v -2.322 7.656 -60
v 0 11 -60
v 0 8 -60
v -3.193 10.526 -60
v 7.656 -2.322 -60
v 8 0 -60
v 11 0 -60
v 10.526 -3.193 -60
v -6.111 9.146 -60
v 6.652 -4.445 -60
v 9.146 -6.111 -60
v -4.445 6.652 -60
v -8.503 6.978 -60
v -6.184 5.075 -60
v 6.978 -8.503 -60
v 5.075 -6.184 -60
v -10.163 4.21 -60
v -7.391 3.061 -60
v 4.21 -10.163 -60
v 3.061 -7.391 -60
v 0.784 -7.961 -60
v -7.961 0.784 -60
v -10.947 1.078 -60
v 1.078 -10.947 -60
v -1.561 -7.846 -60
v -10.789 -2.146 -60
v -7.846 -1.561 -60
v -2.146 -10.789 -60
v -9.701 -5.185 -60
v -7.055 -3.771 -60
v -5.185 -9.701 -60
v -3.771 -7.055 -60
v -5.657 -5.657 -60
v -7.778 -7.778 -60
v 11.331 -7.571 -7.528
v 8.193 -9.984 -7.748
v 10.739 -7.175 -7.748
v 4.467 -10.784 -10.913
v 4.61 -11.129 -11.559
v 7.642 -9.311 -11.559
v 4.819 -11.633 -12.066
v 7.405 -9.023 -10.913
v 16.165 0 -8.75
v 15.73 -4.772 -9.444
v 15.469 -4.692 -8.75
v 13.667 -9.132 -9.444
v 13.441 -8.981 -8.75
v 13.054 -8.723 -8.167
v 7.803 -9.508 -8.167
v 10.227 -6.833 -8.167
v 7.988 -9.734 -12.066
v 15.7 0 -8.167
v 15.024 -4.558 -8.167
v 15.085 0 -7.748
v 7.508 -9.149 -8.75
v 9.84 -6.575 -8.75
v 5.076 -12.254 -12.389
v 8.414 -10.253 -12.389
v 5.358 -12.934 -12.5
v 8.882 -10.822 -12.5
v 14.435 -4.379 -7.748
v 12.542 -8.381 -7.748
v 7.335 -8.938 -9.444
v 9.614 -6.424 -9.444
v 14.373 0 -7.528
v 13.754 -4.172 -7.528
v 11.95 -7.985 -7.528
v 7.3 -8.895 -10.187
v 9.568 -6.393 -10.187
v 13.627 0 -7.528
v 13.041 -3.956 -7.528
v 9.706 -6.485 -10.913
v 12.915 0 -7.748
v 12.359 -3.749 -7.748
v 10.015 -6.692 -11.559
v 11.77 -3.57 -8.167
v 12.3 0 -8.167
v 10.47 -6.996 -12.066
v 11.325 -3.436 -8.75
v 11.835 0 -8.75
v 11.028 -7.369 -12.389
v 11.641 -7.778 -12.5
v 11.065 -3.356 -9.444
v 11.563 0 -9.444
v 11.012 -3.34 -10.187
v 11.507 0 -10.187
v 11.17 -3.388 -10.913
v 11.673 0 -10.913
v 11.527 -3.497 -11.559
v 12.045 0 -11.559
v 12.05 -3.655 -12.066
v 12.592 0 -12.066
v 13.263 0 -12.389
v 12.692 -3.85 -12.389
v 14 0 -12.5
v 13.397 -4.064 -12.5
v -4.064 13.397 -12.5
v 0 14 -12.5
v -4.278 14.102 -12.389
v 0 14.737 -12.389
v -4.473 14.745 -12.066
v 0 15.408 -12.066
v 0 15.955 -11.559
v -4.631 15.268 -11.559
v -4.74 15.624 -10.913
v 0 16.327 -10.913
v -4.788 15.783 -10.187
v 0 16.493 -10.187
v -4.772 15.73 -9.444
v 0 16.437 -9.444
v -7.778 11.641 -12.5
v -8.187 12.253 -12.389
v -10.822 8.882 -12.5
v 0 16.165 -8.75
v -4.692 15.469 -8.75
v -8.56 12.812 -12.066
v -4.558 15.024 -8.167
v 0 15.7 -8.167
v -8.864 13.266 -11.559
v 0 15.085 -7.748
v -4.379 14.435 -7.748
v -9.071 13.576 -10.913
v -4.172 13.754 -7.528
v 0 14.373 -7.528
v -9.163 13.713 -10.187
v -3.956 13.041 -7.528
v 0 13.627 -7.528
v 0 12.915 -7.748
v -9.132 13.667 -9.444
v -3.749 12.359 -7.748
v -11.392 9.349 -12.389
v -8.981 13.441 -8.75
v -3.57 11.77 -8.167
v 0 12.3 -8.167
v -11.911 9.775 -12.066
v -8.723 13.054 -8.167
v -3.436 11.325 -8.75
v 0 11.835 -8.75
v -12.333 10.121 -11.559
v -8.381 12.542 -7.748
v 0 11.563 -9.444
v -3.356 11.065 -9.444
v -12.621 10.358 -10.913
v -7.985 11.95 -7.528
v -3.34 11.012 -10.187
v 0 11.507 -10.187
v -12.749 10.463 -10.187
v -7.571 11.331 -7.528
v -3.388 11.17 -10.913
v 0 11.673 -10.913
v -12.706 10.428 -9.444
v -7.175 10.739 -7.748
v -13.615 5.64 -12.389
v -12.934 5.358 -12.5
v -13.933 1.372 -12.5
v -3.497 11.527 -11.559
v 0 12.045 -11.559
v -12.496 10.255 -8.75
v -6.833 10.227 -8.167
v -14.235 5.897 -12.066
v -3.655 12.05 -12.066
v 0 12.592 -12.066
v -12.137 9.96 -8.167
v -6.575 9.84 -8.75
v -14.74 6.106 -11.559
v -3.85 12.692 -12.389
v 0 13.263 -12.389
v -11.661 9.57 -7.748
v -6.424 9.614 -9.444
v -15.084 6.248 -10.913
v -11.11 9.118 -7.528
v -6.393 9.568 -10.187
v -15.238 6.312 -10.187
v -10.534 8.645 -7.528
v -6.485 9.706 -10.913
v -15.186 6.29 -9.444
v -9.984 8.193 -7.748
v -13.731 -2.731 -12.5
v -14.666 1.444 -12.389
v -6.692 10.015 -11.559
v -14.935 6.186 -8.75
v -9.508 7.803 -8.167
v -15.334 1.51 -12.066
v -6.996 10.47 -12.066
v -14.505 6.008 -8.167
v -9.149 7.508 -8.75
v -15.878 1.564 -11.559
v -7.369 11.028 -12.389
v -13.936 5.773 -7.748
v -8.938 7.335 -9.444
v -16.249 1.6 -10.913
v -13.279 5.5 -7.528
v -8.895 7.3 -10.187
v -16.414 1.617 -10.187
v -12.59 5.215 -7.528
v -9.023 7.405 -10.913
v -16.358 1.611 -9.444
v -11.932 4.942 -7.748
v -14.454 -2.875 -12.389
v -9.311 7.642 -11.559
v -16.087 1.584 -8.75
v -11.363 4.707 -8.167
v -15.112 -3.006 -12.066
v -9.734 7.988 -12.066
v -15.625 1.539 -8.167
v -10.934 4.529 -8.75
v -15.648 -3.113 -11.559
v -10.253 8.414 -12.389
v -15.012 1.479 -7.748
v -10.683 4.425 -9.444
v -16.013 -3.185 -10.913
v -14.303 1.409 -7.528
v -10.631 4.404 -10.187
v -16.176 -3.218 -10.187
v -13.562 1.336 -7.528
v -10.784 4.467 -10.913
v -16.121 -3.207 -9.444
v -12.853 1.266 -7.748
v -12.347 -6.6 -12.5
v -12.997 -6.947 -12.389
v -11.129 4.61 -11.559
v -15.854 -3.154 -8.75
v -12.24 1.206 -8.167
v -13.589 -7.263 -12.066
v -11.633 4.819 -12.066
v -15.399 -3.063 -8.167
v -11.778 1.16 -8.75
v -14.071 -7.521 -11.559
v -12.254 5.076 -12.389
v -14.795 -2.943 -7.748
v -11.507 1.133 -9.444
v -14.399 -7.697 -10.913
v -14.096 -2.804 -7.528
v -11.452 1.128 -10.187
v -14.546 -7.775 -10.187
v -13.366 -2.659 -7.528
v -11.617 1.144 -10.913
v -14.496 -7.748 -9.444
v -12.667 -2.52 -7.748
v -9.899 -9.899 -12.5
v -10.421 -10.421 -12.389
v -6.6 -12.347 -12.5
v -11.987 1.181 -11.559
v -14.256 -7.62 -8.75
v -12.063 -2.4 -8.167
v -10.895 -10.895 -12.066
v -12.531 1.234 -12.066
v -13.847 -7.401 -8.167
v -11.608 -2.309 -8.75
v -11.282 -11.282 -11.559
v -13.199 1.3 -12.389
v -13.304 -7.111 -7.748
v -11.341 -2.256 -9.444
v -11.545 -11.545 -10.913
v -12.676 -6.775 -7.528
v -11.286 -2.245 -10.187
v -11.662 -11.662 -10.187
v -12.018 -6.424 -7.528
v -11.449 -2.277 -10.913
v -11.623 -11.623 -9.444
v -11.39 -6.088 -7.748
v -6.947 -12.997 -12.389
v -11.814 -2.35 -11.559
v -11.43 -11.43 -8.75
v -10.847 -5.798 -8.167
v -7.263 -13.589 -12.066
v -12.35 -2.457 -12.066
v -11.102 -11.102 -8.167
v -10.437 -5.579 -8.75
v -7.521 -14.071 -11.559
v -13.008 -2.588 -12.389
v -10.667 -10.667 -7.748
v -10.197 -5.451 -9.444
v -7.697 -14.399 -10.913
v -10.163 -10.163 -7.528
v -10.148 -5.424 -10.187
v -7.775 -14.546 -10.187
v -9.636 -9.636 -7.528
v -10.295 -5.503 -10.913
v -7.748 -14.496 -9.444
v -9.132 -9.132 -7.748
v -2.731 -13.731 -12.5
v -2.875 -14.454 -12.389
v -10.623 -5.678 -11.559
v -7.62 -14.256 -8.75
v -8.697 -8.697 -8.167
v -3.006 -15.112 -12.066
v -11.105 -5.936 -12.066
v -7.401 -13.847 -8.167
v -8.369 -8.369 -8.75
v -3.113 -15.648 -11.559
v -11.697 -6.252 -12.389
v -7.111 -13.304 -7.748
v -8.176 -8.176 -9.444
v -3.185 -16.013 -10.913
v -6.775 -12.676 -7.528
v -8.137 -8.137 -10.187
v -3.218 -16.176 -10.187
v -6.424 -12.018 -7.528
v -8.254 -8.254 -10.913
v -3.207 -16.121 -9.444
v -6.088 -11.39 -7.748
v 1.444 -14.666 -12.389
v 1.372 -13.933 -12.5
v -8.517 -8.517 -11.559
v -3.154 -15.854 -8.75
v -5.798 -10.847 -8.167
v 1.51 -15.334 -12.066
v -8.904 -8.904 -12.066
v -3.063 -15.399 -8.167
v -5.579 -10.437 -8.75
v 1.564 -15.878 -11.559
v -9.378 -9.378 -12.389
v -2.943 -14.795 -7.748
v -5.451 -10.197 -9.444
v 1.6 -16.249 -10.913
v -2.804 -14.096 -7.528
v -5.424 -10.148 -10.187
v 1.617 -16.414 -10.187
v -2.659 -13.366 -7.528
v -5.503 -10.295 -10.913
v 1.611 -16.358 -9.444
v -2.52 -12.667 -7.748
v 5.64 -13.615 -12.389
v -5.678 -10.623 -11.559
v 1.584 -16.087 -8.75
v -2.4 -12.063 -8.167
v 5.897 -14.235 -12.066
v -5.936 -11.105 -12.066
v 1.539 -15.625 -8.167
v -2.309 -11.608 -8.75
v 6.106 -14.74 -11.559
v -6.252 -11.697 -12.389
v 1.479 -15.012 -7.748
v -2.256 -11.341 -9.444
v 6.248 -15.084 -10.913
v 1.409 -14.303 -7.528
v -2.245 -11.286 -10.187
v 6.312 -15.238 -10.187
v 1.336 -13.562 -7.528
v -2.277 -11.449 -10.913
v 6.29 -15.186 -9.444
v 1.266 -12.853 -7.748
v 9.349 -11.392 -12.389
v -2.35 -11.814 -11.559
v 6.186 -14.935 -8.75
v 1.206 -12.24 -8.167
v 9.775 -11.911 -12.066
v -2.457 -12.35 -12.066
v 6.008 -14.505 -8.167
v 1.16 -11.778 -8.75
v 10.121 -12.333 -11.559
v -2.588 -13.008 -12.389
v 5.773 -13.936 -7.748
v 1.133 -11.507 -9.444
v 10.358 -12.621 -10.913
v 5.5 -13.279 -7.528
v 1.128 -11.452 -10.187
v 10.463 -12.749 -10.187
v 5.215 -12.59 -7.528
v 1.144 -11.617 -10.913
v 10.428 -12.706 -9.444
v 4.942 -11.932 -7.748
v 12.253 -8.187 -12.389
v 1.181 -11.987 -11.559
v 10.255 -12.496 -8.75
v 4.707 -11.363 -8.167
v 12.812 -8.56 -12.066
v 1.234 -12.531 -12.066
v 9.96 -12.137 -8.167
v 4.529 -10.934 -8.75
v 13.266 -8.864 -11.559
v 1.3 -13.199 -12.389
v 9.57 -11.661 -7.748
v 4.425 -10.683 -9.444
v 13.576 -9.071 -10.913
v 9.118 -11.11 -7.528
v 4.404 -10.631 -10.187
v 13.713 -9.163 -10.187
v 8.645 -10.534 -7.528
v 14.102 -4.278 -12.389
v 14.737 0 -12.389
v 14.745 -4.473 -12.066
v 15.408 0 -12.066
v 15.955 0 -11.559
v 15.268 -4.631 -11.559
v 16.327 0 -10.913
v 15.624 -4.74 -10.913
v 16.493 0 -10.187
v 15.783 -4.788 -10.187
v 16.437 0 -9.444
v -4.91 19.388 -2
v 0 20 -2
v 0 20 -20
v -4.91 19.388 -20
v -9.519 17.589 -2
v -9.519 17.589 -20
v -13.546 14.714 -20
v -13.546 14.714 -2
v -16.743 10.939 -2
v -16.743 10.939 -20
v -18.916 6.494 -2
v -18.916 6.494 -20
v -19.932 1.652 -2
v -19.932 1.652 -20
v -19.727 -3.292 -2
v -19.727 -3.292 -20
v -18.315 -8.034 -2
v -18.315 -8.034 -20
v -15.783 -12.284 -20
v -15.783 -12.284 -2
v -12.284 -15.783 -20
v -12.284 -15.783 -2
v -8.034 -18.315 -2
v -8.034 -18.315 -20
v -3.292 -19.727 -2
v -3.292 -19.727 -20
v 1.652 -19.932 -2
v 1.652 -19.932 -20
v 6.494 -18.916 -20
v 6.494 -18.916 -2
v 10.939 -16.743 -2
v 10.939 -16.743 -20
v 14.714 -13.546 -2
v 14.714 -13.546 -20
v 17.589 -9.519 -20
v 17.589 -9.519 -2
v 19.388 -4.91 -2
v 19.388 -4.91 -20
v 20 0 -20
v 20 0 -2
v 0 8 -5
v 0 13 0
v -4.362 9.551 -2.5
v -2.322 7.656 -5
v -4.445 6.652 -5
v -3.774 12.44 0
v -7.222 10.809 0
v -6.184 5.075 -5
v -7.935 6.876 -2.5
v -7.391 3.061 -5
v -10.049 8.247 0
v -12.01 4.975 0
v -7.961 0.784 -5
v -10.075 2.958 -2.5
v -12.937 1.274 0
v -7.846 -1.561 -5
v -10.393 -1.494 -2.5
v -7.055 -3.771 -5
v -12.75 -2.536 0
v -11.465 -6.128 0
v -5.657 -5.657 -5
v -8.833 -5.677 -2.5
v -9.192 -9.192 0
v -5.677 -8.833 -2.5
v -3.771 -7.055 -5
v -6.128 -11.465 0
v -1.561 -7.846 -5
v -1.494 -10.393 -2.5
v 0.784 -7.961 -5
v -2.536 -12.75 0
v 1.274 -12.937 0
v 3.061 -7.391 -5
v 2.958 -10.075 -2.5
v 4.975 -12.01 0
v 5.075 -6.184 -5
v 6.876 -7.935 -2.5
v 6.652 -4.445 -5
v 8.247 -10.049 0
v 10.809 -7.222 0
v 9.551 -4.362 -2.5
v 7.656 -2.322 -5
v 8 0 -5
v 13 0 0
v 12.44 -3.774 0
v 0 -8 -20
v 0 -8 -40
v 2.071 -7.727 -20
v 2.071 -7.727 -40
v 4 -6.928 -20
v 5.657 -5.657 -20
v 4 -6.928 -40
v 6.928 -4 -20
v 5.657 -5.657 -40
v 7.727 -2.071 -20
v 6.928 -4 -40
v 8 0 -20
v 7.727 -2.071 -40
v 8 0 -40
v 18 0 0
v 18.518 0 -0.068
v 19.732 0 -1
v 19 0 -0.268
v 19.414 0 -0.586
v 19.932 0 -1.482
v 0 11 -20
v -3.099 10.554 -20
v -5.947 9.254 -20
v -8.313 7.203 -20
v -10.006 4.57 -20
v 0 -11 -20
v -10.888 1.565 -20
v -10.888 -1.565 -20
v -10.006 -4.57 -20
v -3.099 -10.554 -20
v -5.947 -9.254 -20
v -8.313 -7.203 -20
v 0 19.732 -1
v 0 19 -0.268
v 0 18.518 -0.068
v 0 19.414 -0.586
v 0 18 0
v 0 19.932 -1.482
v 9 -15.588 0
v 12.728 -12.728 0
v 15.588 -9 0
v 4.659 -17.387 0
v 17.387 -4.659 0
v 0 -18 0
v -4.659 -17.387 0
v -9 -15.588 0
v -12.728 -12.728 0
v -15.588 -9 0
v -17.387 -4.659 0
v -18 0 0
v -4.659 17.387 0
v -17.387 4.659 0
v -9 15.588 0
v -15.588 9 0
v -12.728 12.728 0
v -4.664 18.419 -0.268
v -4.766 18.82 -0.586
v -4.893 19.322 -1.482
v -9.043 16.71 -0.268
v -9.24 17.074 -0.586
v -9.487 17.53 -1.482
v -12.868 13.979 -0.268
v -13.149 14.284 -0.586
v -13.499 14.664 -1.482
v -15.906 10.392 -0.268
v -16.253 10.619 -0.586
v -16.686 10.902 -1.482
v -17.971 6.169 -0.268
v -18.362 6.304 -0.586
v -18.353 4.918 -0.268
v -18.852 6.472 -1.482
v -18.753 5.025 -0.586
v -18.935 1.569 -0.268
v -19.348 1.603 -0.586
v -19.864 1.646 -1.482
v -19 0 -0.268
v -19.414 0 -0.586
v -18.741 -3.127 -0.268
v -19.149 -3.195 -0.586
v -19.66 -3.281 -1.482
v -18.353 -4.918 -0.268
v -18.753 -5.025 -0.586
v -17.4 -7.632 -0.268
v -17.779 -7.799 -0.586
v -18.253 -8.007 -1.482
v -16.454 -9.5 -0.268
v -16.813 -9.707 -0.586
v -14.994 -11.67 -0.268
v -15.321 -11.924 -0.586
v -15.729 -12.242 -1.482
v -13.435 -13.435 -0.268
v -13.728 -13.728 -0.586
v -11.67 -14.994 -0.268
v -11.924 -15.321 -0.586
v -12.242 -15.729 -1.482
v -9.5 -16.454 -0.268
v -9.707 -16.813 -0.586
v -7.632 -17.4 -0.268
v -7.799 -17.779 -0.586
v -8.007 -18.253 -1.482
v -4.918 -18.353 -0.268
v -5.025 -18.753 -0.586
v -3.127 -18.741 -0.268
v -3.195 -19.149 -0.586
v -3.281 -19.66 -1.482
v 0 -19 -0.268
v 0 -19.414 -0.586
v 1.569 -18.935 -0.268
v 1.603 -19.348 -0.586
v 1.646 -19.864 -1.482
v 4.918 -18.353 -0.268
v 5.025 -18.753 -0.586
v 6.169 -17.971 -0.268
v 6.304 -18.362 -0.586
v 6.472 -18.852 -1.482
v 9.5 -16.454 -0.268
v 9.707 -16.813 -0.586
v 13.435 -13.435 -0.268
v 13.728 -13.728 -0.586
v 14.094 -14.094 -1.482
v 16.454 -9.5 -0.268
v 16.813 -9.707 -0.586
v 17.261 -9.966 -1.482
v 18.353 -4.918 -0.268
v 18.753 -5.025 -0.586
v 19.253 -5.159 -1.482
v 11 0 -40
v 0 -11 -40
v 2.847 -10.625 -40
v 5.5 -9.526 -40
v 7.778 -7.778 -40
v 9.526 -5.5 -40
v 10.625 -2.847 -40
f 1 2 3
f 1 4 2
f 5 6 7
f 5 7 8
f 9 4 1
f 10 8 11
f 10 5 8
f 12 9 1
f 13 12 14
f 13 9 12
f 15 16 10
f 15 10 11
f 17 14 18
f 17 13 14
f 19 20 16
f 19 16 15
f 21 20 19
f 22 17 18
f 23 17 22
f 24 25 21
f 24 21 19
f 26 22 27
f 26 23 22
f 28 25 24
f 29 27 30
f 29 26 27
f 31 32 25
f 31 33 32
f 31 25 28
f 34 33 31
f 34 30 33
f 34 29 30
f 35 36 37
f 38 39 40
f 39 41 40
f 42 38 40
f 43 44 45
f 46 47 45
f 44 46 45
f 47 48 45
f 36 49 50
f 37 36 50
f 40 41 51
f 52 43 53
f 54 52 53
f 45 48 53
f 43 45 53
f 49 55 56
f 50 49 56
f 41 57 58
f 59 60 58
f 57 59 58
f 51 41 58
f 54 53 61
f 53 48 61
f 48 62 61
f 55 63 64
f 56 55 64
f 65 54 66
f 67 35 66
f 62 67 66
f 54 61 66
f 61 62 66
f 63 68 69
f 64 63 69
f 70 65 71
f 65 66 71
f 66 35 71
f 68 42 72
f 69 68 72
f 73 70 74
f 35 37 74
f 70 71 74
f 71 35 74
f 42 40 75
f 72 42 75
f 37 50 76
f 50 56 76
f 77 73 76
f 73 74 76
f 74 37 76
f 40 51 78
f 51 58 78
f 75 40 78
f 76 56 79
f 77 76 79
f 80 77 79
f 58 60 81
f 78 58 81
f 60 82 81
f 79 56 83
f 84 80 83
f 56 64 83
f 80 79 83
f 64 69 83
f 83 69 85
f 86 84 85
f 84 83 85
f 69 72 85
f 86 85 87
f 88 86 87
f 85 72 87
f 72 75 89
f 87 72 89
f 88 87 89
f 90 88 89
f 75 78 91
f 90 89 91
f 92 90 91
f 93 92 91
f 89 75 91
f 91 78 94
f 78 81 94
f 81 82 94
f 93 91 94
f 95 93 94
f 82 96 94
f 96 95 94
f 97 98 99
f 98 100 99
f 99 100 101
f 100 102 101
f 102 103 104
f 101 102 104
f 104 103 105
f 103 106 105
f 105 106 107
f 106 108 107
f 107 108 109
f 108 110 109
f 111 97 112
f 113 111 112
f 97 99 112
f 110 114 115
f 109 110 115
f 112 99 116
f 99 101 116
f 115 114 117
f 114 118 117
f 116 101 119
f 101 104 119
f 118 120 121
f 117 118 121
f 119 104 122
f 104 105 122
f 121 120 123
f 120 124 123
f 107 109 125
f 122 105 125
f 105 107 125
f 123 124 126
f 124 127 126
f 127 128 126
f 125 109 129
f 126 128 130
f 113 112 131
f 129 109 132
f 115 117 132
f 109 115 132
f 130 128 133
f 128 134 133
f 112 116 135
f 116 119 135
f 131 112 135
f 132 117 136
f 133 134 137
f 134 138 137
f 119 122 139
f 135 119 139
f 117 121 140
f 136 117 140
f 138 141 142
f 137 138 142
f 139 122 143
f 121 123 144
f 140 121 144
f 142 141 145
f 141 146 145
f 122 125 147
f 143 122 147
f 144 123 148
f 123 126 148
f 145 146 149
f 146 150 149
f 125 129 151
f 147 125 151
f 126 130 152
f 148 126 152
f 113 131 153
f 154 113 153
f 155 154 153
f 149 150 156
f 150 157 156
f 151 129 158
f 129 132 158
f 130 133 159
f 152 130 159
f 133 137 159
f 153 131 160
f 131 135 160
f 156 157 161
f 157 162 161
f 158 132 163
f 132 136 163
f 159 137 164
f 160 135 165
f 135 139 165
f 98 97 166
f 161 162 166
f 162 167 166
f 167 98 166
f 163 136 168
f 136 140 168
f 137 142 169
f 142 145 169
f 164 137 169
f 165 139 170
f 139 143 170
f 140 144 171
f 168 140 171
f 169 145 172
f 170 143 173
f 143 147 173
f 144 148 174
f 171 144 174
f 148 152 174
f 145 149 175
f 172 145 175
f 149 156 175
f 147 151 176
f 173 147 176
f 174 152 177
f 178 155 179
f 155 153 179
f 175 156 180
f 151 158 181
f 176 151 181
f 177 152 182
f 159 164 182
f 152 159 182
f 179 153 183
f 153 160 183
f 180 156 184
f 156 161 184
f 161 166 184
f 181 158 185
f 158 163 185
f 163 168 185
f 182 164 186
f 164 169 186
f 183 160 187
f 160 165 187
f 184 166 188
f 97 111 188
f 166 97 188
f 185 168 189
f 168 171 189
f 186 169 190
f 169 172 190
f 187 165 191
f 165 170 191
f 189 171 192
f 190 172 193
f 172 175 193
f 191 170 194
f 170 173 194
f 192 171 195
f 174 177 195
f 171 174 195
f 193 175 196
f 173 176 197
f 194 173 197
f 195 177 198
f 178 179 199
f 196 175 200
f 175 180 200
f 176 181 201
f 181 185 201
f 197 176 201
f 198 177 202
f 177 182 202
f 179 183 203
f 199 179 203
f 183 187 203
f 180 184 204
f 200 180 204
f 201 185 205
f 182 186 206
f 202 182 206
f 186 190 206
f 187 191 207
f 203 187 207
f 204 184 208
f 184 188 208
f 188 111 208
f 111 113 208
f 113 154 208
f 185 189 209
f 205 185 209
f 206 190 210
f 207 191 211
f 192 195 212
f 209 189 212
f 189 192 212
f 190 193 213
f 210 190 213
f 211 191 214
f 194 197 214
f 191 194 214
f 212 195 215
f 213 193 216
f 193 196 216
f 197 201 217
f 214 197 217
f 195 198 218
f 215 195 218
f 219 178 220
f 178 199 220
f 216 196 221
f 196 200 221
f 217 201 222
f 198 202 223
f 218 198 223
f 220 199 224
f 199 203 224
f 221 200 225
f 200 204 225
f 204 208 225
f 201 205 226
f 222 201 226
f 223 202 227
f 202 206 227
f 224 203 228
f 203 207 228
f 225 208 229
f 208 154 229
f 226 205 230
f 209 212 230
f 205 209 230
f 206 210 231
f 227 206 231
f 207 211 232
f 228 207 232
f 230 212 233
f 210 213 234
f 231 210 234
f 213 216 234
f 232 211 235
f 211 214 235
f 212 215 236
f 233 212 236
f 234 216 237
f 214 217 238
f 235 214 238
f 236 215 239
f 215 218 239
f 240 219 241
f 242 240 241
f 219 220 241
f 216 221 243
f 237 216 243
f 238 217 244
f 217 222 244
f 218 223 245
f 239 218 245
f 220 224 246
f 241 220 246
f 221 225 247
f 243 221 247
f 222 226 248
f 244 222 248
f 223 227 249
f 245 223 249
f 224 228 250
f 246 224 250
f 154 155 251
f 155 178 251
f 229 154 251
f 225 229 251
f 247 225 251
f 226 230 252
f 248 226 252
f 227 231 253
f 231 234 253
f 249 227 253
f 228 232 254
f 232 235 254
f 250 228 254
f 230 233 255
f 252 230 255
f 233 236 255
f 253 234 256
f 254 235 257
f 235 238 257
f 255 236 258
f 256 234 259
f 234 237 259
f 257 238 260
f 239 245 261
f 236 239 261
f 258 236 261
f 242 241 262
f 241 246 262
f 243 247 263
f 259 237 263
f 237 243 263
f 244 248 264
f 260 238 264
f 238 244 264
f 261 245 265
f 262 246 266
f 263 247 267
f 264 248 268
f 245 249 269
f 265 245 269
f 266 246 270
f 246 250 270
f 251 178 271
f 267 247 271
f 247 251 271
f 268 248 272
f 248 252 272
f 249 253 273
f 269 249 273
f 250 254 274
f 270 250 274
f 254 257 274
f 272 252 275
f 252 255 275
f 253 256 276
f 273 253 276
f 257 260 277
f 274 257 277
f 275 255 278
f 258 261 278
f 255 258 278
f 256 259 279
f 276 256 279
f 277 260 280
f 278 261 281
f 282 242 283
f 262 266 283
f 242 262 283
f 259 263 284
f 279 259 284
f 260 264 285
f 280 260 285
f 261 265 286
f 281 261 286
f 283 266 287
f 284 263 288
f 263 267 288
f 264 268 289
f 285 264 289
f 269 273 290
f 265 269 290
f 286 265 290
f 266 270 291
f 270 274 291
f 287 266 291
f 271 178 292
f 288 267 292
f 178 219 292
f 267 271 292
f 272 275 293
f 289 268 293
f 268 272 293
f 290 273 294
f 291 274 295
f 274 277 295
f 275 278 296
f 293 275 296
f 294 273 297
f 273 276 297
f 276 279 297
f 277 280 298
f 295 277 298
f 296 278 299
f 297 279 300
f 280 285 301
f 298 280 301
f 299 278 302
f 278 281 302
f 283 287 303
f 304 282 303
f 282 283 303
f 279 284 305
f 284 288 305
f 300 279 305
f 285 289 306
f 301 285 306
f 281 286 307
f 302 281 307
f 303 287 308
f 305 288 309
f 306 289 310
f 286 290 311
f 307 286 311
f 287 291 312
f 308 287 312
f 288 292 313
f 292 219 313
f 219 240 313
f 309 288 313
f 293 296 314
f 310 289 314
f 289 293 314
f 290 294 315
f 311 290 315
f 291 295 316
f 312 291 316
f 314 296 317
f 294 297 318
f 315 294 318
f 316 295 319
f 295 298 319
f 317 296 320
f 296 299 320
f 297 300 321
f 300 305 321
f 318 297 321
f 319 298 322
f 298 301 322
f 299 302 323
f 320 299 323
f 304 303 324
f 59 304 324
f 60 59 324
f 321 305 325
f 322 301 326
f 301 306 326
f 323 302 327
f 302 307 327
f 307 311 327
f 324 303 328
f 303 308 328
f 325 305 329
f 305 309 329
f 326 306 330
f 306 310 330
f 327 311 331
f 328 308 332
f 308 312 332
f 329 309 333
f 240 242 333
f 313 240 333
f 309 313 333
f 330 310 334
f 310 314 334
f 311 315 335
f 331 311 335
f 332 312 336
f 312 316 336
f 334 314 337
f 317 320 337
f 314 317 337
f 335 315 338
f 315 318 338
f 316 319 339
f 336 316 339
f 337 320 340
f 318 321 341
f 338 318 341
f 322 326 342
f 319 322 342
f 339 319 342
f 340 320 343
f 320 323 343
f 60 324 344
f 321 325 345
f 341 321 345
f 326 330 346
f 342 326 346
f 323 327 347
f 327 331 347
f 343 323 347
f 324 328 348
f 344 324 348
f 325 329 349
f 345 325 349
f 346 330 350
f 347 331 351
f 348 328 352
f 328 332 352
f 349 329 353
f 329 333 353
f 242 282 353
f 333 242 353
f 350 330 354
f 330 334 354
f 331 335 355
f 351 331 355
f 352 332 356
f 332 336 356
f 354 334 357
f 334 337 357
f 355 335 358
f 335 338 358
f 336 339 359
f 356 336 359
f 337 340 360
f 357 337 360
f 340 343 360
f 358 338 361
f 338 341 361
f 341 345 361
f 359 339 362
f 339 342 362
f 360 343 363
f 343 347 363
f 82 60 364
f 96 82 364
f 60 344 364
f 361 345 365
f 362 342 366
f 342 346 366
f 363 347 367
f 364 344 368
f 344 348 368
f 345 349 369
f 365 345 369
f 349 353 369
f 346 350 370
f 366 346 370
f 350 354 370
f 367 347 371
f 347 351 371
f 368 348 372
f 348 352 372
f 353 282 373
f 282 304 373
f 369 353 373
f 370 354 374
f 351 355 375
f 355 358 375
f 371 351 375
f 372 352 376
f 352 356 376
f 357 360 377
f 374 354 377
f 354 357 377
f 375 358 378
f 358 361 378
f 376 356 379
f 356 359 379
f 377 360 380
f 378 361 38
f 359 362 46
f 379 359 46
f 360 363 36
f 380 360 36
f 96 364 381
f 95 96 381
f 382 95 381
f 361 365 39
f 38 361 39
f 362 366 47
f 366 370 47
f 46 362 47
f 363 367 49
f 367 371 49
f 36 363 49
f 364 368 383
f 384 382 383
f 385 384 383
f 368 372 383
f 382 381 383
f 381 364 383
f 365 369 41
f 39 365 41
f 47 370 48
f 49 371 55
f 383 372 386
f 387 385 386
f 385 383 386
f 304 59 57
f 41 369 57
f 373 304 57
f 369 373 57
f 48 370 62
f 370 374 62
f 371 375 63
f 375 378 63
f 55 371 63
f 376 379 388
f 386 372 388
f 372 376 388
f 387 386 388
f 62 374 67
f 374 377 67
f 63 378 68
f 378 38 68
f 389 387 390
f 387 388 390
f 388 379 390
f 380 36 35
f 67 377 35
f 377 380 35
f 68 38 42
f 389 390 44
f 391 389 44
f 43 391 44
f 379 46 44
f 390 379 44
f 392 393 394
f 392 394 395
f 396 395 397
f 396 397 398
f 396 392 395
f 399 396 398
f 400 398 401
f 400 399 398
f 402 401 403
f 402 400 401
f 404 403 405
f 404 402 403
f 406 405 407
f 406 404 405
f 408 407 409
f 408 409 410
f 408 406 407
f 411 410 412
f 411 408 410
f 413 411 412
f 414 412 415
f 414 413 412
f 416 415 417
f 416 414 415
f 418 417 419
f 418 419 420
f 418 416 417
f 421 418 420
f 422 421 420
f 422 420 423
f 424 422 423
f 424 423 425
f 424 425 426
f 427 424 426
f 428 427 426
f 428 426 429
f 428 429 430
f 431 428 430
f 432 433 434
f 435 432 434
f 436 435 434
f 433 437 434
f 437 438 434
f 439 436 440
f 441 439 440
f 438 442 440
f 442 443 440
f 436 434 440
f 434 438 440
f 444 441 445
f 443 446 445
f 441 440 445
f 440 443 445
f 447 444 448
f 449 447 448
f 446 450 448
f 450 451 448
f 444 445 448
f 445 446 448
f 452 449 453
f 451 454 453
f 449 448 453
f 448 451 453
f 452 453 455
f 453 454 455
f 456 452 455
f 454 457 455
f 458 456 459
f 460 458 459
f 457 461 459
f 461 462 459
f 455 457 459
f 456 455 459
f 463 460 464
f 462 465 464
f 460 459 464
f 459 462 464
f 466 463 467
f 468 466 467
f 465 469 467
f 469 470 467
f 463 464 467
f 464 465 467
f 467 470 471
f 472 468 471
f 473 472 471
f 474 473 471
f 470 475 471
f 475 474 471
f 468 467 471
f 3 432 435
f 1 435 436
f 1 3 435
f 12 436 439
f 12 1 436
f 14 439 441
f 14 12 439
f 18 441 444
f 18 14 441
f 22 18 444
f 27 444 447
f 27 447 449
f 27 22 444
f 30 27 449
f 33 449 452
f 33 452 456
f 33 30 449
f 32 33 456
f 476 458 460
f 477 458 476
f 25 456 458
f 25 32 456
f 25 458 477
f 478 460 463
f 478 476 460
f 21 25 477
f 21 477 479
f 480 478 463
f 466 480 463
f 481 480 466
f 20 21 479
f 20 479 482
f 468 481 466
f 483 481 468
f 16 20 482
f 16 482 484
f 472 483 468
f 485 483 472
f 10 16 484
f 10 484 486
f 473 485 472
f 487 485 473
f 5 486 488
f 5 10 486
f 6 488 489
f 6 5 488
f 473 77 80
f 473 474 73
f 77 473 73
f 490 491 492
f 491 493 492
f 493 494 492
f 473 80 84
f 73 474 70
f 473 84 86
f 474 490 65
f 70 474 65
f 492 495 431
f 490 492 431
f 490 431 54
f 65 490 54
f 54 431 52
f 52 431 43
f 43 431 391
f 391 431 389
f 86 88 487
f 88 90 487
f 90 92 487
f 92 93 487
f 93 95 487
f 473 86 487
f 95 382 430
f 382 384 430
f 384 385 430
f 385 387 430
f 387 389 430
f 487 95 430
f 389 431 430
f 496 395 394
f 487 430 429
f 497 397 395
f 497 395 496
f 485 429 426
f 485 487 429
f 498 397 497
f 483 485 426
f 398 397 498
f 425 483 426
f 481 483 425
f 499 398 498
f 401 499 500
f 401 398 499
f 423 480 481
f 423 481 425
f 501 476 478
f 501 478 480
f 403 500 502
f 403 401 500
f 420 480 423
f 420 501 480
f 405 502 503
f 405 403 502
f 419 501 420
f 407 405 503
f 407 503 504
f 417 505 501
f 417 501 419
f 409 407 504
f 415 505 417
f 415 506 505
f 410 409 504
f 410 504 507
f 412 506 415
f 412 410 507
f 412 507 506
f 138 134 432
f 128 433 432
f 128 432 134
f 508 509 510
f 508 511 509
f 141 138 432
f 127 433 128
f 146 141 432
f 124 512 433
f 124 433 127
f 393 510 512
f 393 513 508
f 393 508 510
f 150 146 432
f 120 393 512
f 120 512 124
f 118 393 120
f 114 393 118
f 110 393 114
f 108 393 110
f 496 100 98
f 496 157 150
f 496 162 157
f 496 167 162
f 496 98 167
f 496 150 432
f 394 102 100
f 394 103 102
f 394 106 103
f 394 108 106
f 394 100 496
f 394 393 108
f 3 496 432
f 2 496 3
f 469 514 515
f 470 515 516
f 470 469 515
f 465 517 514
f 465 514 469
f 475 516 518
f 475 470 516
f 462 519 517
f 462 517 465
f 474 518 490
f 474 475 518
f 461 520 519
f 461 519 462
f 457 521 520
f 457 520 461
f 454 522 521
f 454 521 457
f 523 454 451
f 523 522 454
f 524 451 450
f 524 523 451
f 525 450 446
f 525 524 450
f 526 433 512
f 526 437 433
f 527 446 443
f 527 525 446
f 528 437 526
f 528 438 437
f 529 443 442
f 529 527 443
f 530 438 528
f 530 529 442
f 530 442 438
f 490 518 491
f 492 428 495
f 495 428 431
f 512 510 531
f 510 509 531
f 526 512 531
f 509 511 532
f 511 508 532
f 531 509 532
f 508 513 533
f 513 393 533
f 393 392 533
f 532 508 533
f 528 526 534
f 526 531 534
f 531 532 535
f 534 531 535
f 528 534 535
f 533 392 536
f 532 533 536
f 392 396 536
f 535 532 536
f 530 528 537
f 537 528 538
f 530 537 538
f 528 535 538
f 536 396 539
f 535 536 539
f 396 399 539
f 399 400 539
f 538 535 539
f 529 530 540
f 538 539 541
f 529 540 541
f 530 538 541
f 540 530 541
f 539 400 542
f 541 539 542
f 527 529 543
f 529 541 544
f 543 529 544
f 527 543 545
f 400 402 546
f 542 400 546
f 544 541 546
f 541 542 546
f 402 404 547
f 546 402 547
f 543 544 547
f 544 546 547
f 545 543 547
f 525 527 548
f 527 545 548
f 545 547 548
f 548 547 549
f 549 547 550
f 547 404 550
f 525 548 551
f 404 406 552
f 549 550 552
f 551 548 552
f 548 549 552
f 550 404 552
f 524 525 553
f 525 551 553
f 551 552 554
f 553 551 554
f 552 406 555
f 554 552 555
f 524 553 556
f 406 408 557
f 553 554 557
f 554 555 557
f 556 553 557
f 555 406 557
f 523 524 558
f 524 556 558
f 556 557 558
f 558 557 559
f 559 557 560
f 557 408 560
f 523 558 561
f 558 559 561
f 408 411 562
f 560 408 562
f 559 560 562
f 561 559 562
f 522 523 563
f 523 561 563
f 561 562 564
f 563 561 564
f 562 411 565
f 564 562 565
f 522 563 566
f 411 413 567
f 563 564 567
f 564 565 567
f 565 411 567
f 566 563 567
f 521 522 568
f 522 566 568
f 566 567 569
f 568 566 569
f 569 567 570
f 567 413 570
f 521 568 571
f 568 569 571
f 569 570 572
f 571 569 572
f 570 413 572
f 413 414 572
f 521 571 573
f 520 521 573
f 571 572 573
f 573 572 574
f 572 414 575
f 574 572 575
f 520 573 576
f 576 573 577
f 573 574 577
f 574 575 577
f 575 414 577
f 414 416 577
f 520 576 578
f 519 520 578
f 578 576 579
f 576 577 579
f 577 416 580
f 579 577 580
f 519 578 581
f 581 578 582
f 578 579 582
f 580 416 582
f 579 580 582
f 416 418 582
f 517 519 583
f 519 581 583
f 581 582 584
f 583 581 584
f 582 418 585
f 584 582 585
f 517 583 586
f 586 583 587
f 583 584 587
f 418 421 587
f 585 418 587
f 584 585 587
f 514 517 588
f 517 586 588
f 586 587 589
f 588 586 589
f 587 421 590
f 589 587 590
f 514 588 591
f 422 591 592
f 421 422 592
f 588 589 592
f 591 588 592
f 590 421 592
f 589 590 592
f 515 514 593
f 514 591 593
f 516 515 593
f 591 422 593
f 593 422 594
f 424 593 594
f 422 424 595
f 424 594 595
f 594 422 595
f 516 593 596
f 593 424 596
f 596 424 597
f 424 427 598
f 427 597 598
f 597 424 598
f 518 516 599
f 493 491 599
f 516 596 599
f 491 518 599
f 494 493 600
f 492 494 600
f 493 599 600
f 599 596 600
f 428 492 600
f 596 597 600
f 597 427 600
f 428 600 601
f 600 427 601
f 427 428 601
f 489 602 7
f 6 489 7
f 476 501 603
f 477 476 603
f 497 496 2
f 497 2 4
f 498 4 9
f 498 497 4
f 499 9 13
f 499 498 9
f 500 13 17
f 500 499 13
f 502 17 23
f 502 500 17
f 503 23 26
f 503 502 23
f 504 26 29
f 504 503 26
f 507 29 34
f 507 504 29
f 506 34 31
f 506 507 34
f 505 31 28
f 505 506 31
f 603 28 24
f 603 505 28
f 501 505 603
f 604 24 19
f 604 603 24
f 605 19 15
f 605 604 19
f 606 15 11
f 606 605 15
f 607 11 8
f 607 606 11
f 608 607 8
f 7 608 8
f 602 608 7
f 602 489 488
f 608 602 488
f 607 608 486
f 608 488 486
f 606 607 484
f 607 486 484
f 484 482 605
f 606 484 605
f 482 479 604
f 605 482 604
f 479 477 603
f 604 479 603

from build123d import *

# Parameters (mm, degrees)
SKETCH6_W      = 20
SKETCH6_H      = 12
SKETCH6_R      = 2.5
SKETCH6_H_2    = 3
REVOLVE3_ANGLE = 270
SKETCH6_3_W    = 40
SKETCH6_3_H    = 3
REVOLVE4_ANGLE = 180
CHAMFER1_SIZE  = 5
FILLET1_R      = 2


with BuildPart() as part:
    # Sketch6 → Revolve3 (revolve)
    # profile 1 of 2: a face of its own
    with BuildSketch(Plane(origin=(0, 0, 0), x_dir=(0, 0, -1), z_dir=(1, 0, 0))):
        with Locations((10, 14)):
            Rectangle(SKETCH6_W, SKETCH6_H)
        with Locations((10, 14)):
            Circle(SKETCH6_R, mode=Mode.SUBTRACT)
    # profile 2 of 2: a face of its own
    with BuildSketch(Plane(origin=(0, 0, 0), x_dir=(0, 0, -1), z_dir=(1, 0, 0))):
        with Locations((50, 9.5)):
            Rectangle(SKETCH6_W, SKETCH6_H_2)
    revolve(axis=Axis((0, 0, 0), (0, 0, 1)), revolution_arc=REVOLVE3_ANGLE)

    # Sketch6<3> → Revolve4 (revolve)
    with BuildSketch(Plane(origin=(0, 0, 0), x_dir=(0, 0, -1), z_dir=(1, 0, 0))):
        with Locations((40, 9.5)):
            Rectangle(SKETCH6_3_W, SKETCH6_3_H)
    revolve(axis=Axis((0, 0, 0), (0, 0, 1)), revolution_arc=REVOLVE4_ANGLE)

    # Chamfer1
    chamfer1_edges = [part.edges().sort_by_distance(p)[0] for p in [
        (-5.656854249, -5.656854249, 0),
    ]]
    chamfer(chamfer1_edges, length=CHAMFER1_SIZE)

    # Fillet1
    fillet1_edges = [part.edges().sort_by_distance(p)[0] for p in [
        (-14.142135624, -14.142135624, 0),
    ]]
    fillet(fillet1_edges, radius=FILLET1_R)


solid = part.part
